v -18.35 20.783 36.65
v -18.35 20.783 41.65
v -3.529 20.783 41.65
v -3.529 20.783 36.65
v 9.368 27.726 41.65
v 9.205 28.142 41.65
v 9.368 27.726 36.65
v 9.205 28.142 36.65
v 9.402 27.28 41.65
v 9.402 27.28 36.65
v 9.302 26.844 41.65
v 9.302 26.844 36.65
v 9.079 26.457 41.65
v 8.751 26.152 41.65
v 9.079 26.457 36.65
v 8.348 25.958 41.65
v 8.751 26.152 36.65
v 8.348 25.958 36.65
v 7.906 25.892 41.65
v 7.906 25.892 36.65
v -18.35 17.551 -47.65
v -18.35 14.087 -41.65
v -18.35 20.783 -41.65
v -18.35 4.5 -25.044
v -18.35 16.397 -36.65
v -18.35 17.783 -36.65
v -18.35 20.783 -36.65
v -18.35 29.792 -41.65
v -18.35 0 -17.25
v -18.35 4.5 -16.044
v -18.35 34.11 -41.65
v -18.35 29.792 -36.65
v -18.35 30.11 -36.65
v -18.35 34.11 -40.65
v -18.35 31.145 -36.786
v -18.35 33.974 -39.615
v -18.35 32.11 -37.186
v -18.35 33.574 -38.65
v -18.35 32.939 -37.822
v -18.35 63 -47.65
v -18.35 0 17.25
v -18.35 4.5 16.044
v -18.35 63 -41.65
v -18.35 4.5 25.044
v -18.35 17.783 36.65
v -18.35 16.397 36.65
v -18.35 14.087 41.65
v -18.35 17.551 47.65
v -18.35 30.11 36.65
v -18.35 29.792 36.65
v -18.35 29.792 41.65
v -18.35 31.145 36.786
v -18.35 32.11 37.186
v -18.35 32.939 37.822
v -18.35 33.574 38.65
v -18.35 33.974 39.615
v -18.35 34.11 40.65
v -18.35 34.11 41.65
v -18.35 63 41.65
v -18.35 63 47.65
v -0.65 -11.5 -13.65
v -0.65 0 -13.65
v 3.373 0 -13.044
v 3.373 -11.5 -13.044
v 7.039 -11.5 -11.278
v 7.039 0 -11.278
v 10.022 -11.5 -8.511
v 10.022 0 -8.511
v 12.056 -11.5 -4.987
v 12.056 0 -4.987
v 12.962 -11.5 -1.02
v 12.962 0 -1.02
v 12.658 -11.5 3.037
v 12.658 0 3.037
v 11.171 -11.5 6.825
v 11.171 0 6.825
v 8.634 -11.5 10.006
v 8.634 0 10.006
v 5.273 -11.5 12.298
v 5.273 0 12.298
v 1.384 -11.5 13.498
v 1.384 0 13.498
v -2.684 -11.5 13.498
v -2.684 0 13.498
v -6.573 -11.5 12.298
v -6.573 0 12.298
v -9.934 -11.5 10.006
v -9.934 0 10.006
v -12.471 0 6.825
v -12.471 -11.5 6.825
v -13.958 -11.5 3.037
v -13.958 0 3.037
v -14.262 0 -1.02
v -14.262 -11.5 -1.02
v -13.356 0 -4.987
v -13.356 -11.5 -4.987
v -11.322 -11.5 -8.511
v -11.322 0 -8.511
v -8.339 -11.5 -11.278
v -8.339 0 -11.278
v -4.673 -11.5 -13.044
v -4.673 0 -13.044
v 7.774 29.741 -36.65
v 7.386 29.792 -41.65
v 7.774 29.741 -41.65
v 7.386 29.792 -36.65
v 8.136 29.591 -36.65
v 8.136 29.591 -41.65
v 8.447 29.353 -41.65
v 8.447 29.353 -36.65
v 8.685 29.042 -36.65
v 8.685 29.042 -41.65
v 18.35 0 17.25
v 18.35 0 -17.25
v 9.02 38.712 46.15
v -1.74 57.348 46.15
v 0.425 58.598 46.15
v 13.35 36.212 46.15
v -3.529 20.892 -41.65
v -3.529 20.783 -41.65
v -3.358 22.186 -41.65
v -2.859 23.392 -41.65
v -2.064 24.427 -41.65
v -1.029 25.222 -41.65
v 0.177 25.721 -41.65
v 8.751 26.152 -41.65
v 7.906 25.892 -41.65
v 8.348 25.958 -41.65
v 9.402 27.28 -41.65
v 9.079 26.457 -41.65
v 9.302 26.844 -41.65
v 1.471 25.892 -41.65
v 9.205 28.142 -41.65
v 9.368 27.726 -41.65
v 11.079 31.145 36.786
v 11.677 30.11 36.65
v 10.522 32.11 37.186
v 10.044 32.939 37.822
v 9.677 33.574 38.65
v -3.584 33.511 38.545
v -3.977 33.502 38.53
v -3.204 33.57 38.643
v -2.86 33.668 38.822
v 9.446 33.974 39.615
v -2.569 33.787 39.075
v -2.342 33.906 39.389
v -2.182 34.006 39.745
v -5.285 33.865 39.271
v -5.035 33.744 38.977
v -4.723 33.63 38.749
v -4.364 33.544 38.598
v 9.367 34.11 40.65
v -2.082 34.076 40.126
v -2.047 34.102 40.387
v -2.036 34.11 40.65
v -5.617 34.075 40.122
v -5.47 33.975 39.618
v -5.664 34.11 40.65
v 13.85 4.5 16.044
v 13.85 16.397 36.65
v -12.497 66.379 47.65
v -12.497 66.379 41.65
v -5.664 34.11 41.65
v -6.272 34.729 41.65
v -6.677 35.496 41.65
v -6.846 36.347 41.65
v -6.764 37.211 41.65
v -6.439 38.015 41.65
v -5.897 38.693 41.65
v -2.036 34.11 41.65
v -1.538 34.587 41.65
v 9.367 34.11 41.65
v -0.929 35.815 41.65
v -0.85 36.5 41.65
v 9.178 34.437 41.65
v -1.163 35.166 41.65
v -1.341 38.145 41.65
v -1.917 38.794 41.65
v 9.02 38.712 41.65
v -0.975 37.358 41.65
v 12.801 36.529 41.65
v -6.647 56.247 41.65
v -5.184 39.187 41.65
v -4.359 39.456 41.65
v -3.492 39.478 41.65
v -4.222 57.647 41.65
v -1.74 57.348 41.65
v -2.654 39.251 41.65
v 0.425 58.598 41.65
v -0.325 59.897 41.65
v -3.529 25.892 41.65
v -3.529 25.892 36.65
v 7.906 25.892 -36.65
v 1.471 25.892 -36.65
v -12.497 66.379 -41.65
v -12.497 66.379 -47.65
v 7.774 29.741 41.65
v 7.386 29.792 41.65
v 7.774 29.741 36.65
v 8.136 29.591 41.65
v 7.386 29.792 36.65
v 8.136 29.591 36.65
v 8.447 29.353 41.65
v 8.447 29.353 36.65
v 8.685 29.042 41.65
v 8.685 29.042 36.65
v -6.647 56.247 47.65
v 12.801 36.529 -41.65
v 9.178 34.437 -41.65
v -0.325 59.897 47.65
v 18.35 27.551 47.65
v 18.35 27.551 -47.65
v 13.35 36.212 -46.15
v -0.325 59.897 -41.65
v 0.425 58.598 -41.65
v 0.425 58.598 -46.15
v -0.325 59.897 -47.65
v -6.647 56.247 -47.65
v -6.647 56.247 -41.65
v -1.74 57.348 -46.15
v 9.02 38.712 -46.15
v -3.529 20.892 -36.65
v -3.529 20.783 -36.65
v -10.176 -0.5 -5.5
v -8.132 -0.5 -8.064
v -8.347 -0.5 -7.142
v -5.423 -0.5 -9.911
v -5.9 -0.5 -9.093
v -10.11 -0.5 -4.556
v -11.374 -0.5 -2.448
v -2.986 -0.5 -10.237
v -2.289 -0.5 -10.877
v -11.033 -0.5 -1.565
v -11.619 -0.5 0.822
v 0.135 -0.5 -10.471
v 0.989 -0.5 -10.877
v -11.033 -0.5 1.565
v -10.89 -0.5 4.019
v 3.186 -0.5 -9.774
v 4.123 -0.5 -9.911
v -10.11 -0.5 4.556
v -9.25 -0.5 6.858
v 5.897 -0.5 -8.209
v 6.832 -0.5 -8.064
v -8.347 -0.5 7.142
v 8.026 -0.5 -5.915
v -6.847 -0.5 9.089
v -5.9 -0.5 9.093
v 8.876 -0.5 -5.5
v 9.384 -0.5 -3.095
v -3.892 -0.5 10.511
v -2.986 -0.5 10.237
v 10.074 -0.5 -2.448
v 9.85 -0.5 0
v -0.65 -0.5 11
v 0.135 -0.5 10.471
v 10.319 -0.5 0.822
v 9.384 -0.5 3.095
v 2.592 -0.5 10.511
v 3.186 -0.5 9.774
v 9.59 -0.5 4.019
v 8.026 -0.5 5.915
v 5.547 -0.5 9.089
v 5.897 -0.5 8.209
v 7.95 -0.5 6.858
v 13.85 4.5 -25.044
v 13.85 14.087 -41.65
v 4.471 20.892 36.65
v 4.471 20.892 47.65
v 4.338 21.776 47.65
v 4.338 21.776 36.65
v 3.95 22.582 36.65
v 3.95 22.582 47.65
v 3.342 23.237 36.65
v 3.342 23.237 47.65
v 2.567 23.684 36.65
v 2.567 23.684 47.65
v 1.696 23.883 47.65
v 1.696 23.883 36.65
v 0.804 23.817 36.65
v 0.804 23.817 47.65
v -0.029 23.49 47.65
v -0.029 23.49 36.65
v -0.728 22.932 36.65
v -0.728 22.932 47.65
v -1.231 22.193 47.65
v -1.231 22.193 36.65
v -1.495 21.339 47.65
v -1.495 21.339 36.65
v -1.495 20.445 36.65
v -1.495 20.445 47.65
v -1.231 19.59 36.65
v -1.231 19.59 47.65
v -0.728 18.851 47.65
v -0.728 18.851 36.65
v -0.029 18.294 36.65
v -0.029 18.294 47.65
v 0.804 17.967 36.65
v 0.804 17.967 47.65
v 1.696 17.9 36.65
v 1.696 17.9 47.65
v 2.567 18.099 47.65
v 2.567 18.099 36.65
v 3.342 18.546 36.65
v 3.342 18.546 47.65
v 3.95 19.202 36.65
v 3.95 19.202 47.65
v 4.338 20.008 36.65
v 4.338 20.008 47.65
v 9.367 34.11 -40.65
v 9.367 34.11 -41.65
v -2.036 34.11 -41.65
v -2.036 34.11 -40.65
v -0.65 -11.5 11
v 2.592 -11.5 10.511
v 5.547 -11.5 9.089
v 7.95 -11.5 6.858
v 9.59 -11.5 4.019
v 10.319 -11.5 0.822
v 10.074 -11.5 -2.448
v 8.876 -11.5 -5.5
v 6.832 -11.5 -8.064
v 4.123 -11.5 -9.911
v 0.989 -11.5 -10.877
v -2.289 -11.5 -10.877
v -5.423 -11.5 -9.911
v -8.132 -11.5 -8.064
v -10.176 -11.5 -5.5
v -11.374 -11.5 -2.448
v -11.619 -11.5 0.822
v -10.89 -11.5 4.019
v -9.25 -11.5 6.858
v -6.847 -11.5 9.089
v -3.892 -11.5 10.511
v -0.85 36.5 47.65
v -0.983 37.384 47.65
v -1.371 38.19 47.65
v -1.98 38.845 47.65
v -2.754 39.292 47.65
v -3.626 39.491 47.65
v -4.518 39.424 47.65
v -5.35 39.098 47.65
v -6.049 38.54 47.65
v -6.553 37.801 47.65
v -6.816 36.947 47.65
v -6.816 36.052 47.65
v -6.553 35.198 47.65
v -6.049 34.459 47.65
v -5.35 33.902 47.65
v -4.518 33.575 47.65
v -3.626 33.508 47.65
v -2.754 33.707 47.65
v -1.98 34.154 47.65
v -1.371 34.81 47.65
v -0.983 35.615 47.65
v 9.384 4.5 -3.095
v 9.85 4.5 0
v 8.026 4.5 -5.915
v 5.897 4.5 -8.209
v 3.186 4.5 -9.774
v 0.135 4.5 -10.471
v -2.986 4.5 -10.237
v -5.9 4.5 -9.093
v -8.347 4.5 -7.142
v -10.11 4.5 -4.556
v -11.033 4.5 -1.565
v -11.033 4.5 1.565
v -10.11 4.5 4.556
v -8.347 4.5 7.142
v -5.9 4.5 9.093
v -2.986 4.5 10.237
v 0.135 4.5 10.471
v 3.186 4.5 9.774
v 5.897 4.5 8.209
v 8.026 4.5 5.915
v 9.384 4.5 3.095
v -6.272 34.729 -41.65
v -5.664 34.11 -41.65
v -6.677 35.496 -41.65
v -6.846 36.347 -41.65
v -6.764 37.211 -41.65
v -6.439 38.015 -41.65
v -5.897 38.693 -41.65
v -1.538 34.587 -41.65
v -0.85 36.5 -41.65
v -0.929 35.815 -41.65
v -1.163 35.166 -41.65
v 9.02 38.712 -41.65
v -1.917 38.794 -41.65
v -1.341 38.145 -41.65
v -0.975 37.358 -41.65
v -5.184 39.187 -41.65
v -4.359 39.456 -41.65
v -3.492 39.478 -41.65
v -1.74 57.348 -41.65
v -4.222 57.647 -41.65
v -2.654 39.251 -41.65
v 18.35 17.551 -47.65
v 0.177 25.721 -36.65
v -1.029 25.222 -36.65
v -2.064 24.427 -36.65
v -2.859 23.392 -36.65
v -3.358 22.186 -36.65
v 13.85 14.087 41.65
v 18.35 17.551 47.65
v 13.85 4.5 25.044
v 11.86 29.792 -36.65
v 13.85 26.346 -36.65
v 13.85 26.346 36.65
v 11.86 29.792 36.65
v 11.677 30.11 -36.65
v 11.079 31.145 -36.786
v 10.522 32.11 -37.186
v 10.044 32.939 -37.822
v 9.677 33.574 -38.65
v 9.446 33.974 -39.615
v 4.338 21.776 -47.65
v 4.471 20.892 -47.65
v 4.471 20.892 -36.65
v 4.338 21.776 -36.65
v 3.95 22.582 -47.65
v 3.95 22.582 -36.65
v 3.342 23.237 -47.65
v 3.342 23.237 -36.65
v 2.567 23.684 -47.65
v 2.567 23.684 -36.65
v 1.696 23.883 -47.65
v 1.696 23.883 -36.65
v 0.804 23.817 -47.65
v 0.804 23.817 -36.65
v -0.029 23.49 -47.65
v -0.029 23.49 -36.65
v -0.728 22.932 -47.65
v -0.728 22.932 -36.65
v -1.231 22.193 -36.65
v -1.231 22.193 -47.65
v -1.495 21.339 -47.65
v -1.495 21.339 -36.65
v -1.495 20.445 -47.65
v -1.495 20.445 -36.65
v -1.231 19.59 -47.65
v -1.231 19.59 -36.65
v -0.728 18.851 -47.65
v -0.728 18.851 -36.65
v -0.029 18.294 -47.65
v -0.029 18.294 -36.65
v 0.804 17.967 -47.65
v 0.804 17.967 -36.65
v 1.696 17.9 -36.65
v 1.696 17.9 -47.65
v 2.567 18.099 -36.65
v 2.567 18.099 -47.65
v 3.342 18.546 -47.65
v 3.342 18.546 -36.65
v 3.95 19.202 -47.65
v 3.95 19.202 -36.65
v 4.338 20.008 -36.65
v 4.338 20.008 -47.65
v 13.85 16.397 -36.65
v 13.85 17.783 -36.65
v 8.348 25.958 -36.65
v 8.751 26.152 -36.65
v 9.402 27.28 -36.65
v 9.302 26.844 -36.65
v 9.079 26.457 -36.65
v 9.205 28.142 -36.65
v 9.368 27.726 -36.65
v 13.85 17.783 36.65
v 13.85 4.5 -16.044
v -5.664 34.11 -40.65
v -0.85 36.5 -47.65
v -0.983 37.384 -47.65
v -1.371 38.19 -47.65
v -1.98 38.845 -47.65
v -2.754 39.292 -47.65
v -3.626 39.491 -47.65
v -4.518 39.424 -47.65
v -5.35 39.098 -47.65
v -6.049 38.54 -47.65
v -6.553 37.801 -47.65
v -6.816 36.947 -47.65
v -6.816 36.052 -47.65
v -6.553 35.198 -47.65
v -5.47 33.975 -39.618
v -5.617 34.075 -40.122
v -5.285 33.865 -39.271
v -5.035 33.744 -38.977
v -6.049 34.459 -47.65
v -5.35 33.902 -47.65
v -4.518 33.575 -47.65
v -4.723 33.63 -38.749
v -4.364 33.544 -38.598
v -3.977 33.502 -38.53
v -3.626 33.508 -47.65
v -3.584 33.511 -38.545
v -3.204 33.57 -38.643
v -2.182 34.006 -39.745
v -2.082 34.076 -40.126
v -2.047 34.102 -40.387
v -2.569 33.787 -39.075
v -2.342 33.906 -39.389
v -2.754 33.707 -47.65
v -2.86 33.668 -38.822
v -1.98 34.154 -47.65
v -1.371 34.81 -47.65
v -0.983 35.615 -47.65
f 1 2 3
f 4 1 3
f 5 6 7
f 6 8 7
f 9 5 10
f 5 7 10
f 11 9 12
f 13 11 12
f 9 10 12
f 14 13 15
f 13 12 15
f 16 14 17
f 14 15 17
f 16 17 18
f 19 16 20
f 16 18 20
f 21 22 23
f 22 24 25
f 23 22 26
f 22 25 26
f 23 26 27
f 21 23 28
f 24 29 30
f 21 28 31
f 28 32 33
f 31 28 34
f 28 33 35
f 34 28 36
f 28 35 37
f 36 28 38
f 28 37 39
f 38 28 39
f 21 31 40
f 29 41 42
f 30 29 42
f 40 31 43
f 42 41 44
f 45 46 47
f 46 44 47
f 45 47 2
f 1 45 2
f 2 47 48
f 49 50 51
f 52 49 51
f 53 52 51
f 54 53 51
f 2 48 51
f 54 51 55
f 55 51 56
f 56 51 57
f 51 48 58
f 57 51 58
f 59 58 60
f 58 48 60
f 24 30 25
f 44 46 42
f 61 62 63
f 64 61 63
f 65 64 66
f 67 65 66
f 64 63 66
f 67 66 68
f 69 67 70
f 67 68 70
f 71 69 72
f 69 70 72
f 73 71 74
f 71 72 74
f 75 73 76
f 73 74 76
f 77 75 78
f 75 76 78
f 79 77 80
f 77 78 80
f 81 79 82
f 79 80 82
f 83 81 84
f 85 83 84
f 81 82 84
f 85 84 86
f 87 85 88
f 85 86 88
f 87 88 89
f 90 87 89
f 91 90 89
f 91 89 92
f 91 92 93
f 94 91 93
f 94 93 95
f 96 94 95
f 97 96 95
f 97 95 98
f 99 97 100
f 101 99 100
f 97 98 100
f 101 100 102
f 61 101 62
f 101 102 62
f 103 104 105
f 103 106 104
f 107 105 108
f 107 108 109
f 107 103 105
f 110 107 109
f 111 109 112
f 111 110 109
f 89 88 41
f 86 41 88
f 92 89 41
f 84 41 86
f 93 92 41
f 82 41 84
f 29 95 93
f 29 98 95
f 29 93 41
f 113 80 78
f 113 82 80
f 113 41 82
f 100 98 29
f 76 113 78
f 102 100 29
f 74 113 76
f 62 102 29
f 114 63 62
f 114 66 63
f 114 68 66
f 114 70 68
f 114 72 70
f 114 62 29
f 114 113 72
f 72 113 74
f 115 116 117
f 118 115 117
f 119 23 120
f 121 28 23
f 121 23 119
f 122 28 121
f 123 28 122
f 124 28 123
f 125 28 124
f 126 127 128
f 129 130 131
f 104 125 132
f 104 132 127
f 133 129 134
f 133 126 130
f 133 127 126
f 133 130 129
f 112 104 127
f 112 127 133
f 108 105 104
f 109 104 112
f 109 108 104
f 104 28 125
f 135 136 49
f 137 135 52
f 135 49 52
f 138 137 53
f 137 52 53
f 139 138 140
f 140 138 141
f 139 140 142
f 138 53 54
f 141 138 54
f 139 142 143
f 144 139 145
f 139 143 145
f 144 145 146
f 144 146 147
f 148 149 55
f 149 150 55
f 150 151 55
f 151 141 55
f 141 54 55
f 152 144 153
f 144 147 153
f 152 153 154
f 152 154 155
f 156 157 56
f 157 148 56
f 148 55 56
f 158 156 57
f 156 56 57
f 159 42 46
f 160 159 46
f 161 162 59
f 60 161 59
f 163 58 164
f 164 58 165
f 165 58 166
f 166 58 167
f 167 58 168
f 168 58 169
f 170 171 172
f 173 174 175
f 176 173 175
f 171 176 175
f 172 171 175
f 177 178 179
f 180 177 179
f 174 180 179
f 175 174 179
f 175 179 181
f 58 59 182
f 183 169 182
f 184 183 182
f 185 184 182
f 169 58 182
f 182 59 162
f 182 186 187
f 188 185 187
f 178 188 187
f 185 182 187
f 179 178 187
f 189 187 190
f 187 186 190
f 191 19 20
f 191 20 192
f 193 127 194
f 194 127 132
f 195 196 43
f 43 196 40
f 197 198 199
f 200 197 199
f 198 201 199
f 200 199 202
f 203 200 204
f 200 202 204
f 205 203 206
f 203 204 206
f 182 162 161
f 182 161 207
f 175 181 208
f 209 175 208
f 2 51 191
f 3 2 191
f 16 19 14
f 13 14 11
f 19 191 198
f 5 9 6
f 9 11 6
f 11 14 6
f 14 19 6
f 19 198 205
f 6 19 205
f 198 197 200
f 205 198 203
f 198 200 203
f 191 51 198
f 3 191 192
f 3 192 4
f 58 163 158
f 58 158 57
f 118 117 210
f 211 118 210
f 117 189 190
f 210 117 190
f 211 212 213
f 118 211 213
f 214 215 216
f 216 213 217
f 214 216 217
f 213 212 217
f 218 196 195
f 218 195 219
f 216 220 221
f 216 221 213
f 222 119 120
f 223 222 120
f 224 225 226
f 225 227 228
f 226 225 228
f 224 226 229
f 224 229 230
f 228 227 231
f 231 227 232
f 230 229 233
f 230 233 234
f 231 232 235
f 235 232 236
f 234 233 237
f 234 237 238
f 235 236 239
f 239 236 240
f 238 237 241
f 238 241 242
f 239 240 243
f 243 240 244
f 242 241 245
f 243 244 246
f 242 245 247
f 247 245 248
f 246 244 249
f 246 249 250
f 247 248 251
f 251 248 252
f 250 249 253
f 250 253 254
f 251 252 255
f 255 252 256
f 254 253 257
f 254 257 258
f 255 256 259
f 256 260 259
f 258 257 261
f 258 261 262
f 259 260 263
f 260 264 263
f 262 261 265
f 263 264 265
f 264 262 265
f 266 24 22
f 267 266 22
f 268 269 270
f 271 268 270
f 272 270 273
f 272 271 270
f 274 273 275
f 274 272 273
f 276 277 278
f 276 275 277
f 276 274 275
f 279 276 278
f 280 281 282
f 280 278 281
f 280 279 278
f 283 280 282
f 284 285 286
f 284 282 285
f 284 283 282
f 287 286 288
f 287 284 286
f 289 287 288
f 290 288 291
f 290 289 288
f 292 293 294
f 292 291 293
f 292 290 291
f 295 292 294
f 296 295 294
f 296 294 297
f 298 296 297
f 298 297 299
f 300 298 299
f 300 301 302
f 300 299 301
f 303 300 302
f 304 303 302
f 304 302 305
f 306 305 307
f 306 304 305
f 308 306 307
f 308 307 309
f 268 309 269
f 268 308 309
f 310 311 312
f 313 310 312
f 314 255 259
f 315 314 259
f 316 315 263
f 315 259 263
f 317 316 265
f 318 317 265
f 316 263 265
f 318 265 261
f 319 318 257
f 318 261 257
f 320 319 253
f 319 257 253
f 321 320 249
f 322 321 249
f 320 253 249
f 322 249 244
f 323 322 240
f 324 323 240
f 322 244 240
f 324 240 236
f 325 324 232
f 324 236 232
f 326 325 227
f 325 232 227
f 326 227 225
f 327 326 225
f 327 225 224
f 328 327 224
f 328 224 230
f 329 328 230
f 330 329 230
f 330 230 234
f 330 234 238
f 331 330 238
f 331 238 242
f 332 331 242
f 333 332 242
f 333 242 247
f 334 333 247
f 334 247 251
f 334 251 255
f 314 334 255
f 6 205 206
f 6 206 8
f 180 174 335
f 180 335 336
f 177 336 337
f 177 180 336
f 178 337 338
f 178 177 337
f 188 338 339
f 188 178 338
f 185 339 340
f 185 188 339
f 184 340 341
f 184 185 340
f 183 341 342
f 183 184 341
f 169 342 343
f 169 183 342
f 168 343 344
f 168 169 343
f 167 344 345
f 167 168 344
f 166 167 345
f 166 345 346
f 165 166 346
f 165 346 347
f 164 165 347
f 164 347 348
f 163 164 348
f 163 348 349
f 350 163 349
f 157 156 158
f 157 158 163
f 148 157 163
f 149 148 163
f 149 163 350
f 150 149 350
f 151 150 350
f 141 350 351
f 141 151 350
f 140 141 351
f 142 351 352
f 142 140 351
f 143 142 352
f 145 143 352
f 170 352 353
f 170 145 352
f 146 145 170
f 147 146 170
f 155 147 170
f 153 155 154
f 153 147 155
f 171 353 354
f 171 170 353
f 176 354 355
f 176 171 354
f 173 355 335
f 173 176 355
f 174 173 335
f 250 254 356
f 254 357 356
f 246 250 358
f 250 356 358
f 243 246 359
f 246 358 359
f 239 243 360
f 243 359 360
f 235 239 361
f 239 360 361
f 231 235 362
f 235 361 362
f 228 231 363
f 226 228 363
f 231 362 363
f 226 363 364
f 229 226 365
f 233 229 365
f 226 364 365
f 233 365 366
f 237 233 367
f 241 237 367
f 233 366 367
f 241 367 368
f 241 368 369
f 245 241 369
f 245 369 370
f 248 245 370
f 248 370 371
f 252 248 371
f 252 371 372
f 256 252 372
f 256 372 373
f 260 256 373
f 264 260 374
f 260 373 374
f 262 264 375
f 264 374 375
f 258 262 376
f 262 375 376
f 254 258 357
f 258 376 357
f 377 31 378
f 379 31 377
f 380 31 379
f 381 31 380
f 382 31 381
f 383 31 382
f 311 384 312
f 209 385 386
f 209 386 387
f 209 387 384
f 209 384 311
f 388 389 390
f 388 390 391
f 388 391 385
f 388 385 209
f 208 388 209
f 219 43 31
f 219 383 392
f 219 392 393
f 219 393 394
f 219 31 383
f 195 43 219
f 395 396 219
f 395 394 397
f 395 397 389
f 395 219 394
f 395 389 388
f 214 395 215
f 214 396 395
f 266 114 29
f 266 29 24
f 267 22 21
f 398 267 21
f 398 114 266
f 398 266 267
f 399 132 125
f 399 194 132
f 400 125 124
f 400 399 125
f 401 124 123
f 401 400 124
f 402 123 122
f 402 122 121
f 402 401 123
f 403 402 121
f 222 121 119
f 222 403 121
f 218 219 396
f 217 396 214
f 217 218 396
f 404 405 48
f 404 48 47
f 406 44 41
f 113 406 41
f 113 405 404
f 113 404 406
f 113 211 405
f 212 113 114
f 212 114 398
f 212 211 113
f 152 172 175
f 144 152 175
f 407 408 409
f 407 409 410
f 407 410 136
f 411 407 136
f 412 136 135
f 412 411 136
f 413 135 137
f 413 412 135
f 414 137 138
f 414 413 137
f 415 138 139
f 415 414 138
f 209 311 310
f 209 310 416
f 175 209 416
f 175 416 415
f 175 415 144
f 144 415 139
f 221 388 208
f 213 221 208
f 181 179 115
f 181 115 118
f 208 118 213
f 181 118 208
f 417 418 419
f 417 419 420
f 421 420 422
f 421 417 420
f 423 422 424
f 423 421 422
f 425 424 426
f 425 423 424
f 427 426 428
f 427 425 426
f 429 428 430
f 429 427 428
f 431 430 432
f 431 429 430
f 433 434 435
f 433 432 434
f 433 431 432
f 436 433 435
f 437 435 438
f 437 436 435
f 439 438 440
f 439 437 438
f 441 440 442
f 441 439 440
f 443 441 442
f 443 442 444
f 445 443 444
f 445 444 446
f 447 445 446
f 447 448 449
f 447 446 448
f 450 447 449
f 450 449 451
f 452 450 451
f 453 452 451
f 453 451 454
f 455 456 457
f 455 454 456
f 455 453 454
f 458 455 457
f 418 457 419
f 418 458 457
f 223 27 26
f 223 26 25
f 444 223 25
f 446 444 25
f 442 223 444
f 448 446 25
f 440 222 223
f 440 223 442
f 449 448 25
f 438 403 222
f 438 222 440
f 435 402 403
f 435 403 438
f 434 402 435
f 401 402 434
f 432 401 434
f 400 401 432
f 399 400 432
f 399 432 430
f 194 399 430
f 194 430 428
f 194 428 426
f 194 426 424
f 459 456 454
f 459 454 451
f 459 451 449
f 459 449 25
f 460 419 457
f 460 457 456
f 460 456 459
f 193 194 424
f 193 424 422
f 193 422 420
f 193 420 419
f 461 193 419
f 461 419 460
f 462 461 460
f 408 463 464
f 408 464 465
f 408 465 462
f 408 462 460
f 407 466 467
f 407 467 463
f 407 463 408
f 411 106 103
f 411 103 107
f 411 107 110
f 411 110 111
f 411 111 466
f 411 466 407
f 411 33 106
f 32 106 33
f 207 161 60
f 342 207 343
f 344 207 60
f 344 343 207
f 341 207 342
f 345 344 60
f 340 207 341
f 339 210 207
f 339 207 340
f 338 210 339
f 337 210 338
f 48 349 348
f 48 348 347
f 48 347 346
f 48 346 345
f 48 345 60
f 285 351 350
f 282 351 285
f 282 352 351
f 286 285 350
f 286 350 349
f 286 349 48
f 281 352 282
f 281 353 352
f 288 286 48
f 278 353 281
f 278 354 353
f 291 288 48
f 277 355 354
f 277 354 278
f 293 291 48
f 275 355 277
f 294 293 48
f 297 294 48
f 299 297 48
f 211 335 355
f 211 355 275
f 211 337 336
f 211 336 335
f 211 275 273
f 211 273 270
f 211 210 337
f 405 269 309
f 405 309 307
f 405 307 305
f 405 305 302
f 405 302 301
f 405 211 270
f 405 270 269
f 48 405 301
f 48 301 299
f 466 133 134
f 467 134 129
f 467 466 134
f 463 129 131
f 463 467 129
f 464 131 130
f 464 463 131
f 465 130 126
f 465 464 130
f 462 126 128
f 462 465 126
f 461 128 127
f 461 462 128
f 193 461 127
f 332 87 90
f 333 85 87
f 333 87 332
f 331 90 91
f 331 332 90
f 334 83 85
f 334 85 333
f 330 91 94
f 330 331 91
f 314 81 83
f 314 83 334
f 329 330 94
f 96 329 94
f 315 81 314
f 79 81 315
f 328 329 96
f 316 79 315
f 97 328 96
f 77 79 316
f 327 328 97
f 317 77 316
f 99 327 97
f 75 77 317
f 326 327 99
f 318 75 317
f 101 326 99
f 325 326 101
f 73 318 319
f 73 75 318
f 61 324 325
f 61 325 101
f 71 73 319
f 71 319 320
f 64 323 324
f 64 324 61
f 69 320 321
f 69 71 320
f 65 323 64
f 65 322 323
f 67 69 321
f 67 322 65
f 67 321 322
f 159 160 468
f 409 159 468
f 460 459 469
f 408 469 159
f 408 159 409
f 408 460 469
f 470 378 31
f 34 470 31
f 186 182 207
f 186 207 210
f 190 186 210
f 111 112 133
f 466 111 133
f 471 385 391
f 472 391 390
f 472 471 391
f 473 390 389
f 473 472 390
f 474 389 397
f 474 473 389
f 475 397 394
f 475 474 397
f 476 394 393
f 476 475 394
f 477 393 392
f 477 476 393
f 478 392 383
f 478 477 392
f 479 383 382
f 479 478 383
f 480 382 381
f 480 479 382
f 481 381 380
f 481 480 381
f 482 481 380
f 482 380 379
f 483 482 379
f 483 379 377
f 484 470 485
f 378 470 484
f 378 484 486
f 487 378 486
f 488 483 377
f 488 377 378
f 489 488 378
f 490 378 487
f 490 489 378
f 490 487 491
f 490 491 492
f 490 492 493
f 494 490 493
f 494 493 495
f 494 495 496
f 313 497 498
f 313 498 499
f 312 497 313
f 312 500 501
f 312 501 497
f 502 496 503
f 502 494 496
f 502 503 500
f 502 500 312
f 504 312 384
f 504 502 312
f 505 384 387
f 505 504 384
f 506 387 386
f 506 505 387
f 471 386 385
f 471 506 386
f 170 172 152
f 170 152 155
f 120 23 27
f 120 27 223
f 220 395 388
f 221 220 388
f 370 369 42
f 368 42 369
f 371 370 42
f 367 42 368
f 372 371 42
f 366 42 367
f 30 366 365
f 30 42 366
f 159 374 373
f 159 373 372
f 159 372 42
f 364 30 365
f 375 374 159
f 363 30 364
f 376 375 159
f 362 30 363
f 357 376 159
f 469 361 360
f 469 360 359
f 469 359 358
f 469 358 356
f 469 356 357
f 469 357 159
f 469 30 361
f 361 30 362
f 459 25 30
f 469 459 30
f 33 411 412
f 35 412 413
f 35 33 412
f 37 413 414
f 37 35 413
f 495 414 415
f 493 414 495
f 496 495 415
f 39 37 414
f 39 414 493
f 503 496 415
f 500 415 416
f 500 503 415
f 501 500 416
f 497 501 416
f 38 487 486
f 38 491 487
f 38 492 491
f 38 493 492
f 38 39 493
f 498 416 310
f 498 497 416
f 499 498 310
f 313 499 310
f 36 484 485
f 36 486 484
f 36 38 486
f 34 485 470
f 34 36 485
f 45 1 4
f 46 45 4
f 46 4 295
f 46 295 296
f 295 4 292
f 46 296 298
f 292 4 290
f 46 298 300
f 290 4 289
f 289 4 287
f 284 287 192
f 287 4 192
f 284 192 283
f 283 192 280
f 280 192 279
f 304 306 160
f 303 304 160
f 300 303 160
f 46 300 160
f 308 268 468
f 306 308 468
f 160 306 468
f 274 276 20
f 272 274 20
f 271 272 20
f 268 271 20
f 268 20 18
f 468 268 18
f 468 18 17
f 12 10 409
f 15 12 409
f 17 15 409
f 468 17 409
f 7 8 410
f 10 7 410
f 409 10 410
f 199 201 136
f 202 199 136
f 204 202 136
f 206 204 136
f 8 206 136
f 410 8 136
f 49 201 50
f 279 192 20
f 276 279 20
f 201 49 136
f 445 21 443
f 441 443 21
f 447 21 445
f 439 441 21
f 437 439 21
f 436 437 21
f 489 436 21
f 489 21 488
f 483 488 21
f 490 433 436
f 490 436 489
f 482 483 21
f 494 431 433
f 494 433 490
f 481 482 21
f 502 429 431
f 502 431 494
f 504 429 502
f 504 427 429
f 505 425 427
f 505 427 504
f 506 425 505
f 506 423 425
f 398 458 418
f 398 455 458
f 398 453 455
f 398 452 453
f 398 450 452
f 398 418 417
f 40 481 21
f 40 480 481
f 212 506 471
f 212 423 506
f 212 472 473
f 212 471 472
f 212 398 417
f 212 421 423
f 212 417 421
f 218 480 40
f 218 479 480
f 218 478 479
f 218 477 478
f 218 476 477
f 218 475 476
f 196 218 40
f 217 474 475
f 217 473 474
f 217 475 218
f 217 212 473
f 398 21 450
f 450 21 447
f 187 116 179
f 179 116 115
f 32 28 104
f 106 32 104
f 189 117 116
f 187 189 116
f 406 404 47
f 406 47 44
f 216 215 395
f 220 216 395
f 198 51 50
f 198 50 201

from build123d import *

# Parameters (mm, degrees)
EXTRUDE_1_DEPTH         = 18.35
CUT_EXTRUDE_1_DEPTH     = 95.3
SHELL1_START            = -41.65
SHELL1_DEPTH            = 83.3
SHELL1_START_2          = -18.35
SHELL1_2_DEPTH          = 32.2
CUT_EXTRUDE_2_REACH     = 121.678
SKETCH_5_R              = 13.65
EXTRUDE_2_DEPTH         = 11.5
CUT_EXTRUDE1_DEPTH      = 92.3
SKETCH4_W               = 83.3
SKETCH4_H               = 26.8
CUT_EXTRUDE2_DEPTH      = 4.5
M24_TAPPED_HOLE2_D      = 21
M24_TAPPED_HOLE2_DEPTH  = 16
M24_TAPPED_HOLE2_TIP    = 6.3090365
HOLEWZD2_D              = 22
HOLEWZD2_DEPTH          = 11
SKETCH20_W              = 14.821429848
SKETCH20_H              = 1.5
SKETCH20_W_2            = 17.378570152
BOSS_EXTRUDE2_DEPTH     = 5
FILLET1_R               = 1.5
FILLET2_R               = 4
SKETCH21_W              = 32.2
SKETCH21_H              = 2.401923789
BOSS_EXTRUDE3_DEPTH     = 2
FILLET1_OF_MIRROR1_R    = 1.5
FILLET2_OF_MIRROR1_R    = 4
CUT_EXTRUDE3_DEPTH      = 113.771632022
CUT_EXTRUDE3_DEPTH_BACK = 113.771632022
SKETCH22_R              = 3
FILLET3_R               = 5
CUT_EXTRUDE4_DEPTH      = 109.855137726
CUT_EXTRUDE4_DEPTH_BACK = 109.855137726
SKETCH23_R              = 3


with BuildPart() as part:
    # Эскиз2 → Бобышка-Вытянуть1 (new, symmetric)
    with BuildSketch(Plane(origin=(0, 0, 0), x_dir=(0, 0, -1), z_dir=(1, 0, 0))):
        Polygon((-17.25, 0), (17.25, 0), (47.65, 17.551448183), (47.65, 87.222990915), (-47.65, 87.222990915), (-47.65, 17.551448183), align=None)
    extrude(amount=EXTRUDE_1_DEPTH, both=True)

    # Эскиз3 → Вырез-Вытянуть1 (cut)
    with BuildSketch(Plane(origin=(0, 0, -47.65), x_dir=(-1, 0, 0), z_dir=(0, 0, -1))):
        Polygon((-18.35, 87.222990915), (-18.35, 27.551448183), (6.1746732, 70.029428205), (18.35, 63), (18.35, 87.222990915), align=None)
    extrude(amount=-CUT_EXTRUDE_1_DEPTH, mode=Mode.SUBTRACT)

    # Shell1: read off the stored shape, not the designer's step
    # Shell1 outline → Shell1 (cut)
    with BuildSketch(Plane.XY.offset(SHELL1_START)):
        Polygon((-18.35, 4.5), (13.85, 4.5), (13.85, 26.345676817), (-10.071787517, 67.779428205), (-18.35, 63), align=None)
    extrude(amount=SHELL1_DEPTH, mode=Mode.SUBTRACT)

    # Shell1 2 outline → Shell1 2 (add)
    with BuildSketch(Plane.YZ.offset(SHELL1_START_2)):
        Polygon((19.283498991, -41.65), (4.5, -16.044228634), (4.5, -25.044228634), (14.087346568, -41.65), align=None)
        Polygon((14.087346568, 41.65), (4.5, 25.044228634), (4.5, 16.044228634), (19.283498991, 41.65), align=None)
    extrude(amount=SHELL1_2_DEPTH)

    # Вырез-Вытянуть2: up to this face of the body (flat: up to its plane)
    cut_extrude_2_end = Plane(part.part.faces().sort_by_distance((-3.441629471, 38.42100508, 47.65))[0])
    # Эскиз4 → Вырез-Вытянуть2 (cut, up to the picked face)
    with BuildSketch(Plane(origin=(0, 0, -47.65), x_dir=(-1, 0, 0), z_dir=(0, 0, -1)), mode=Mode.PRIVATE) as cut_extrude_2_sk1:
        Polygon((6.1746732, 70.029428205), (12.496658648, 66.379428205), (6.646658648, 56.246930981), (0.3246732, 59.896930981), align=None)
    cut_extrude_2_tool1 = split(extrude(cut_extrude_2_sk1.sketch, amount=-CUT_EXTRUDE_2_REACH, mode=Mode.PRIVATE), bisect_by=cut_extrude_2_end, keep=Keep.BOTH, mode=Mode.PRIVATE)
    add(cut_extrude_2_tool1.solids().sort_by(Axis((-6.410666, 63.13818, -47.65), (0, 0, 1)))[0], mode=Mode.SUBTRACT)

    # Эскиз5 → Бобышка-Вытянуть2 (add)
    with BuildSketch(Plane.XZ):
        with Locations(Location((-0.65, 0, 0), (0, 0, 270))):
            Circle(SKETCH_5_R)
    extrude(amount=EXTRUDE_2_DEPTH)

    # Sketch3 → Cut-Extrude1 (cut)
    with BuildSketch(Plane.XY.offset(46.15)):
        Polygon((13.35, 36.211702221), (0.4253268, 58.597892875), (-1.73973671, 57.347892875), (9.019872981, 38.711702221), align=None)
    extrude(amount=-CUT_EXTRUDE1_DEPTH, mode=Mode.SUBTRACT)

    # Sketch4 → Cut-Extrude2 (cut)
    with BuildSketch(Plane(origin=(25.692627019, 14.833645126, 0), x_dir=(0, 0, -1), z_dir=(0.8660254037844454, 0.4999999999999885, 0))):
        with Locations((0, 38.634600438)):
            Rectangle(SKETCH4_W, SKETCH4_H)
    extrude(amount=-CUT_EXTRUDE2_DEPTH, mode=Mode.SUBTRACT)

    # M24 Tapped Hole2
    with Locations(Plane(origin=(0, -11.5, 0), x_dir=(-1, 0, 0), z_dir=(0, -1, 0))):
        with Locations((0.65, 0)):
            Hole(M24_TAPPED_HOLE2_D / 2, depth=M24_TAPPED_HOLE2_DEPTH)
            with Locations((0, 0, -(M24_TAPPED_HOLE2_DEPTH + M24_TAPPED_HOLE2_TIP / 2))):  # 118° drill point
                Cone(0, M24_TAPPED_HOLE2_D / 2, M24_TAPPED_HOLE2_TIP, mode=Mode.SUBTRACT)

    # HoleWzd2
    with Locations(Plane(origin=(-0.65, -11.5, 0), x_dir=(0, 0, -1), z_dir=(0, -1, 0))):
        with Locations((0, 0)):
            Hole(HOLEWZD2_D / 2, depth=HOLEWZD2_DEPTH)

    # Sketch20 → Boss-Extrude2 (add)
    with BuildSketch(Plane.XY.offset(-41.65)):
        with Locations((-10.939285076, 18.533498991)):
            Rectangle(SKETCH20_W, SKETCH20_H)
        with Locations((-10.939285076, 20.033498991)):
            Rectangle(SKETCH20_W, SKETCH20_H)
        Polygon((-3.528570152, 25.891773598), (-3.528570152, 20.783498991), (13.85, 20.783498991), (13.85, 25.891773598), (10.503833111, 25.891773598), align=None)
        Polygon((11.860101568, 29.792282004), (8.251873533, 29.792282004), (10.503833111, 25.891773598), (13.85, 25.891773598), (13.85, 26.345676817), align=None)
        Polygon((-18.35, 34.110173911), (-18.35, 29.792282004), (8.251873533, 29.792282004), (11.860101568, 29.792282004), (9.367165513, 34.110173911), align=None)
        with Locations((5.160714924, 18.533498991)):
            Rectangle(SKETCH20_W_2, SKETCH20_H)
        with Locations((5.160714924, 20.033498991)):
            Rectangle(SKETCH20_W_2, SKETCH20_H)
    boss_extrude2 = extrude(amount=BOSS_EXTRUDE2_DEPTH)

    # Fillet1
    fillet1_edges = [part.edges().sort_by_distance(p)[0] for p in [
        (10.503833111, 25.891773598, -39.15),
        (8.251873533, 29.792282004, -39.15),
    ]]
    fillet(fillet1_edges, radius=FILLET1_R)

    # Fillet2
    fillet2_edges = [part.edges().sort_by_distance(p)[0] for p in [
        (-4.491417244, 34.110173911, -36.65),
    ]]
    fillet(fillet2_edges, radius=FILLET2_R)

    # Sketch21 → Boss-Extrude3 (add)
    with BuildSketch(Plane.XZ.offset(-17.783498991)):
        with Locations((-2.25, -37.850961895)):
            Rectangle(SKETCH21_W, SKETCH21_H)
    boss_extrude3 = extrude(amount=BOSS_EXTRUDE3_DEPTH)

    # Mirror1: Boss-Extrude2, Boss-Extrude3 across plane
    add(boss_extrude2.mirror(Plane.XY))
    add(boss_extrude3.mirror(Plane.XY))

    # Fillet1 of Mirror1
    fillet1_of_mirror1_edges = [part.edges().sort_by_distance(p)[0] for p in [
        (10.503833111, 25.891773598, 39.15),
        (8.251873533, 29.792282004, 39.15),
    ]]
    fillet(fillet1_of_mirror1_edges, radius=FILLET1_OF_MIRROR1_R)

    # Fillet2 of Mirror1
    fillet2_of_mirror1_edges = [part.edges().sort_by_distance(p)[0] for p in [
        (-4.491417244, 34.110173911, 36.65),
    ]]
    fillet(fillet2_of_mirror1_edges, radius=FILLET2_OF_MIRROR1_R)

    # Sketch22 → Cut-Extrude3 (cut, two sides: drawn at the far end of the back side and taken through both)
    with BuildSketch(Plane.XY.offset(-41.65).offset(-CUT_EXTRUDE3_DEPTH_BACK)):
        with Locations((-3.85, 36.499622644)):
            Circle(SKETCH22_R)
    extrude(amount=CUT_EXTRUDE3_DEPTH + CUT_EXTRUDE3_DEPTH_BACK, mode=Mode.SUBTRACT)

    # Fillet3
    fillet3_edges = [part.edges().sort_by_distance(p)[0] for p in [
        (-3.528570152, 25.891773598, -39.15),
    ]]
    fillet(fillet3_edges, radius=FILLET3_R)

    # Sketch23 → Cut-Extrude4 (cut, two sides: drawn at the far end of the back side and taken through both)
    with BuildSketch(Plane.XY.offset(-36.65).offset(-CUT_EXTRUDE4_DEPTH_BACK)):
        with Locations((1.471429848, 20.891773598)):
            Circle(SKETCH23_R)
    extrude(amount=CUT_EXTRUDE4_DEPTH + CUT_EXTRUDE4_DEPTH_BACK, mode=Mode.SUBTRACT)


solid = part.part
